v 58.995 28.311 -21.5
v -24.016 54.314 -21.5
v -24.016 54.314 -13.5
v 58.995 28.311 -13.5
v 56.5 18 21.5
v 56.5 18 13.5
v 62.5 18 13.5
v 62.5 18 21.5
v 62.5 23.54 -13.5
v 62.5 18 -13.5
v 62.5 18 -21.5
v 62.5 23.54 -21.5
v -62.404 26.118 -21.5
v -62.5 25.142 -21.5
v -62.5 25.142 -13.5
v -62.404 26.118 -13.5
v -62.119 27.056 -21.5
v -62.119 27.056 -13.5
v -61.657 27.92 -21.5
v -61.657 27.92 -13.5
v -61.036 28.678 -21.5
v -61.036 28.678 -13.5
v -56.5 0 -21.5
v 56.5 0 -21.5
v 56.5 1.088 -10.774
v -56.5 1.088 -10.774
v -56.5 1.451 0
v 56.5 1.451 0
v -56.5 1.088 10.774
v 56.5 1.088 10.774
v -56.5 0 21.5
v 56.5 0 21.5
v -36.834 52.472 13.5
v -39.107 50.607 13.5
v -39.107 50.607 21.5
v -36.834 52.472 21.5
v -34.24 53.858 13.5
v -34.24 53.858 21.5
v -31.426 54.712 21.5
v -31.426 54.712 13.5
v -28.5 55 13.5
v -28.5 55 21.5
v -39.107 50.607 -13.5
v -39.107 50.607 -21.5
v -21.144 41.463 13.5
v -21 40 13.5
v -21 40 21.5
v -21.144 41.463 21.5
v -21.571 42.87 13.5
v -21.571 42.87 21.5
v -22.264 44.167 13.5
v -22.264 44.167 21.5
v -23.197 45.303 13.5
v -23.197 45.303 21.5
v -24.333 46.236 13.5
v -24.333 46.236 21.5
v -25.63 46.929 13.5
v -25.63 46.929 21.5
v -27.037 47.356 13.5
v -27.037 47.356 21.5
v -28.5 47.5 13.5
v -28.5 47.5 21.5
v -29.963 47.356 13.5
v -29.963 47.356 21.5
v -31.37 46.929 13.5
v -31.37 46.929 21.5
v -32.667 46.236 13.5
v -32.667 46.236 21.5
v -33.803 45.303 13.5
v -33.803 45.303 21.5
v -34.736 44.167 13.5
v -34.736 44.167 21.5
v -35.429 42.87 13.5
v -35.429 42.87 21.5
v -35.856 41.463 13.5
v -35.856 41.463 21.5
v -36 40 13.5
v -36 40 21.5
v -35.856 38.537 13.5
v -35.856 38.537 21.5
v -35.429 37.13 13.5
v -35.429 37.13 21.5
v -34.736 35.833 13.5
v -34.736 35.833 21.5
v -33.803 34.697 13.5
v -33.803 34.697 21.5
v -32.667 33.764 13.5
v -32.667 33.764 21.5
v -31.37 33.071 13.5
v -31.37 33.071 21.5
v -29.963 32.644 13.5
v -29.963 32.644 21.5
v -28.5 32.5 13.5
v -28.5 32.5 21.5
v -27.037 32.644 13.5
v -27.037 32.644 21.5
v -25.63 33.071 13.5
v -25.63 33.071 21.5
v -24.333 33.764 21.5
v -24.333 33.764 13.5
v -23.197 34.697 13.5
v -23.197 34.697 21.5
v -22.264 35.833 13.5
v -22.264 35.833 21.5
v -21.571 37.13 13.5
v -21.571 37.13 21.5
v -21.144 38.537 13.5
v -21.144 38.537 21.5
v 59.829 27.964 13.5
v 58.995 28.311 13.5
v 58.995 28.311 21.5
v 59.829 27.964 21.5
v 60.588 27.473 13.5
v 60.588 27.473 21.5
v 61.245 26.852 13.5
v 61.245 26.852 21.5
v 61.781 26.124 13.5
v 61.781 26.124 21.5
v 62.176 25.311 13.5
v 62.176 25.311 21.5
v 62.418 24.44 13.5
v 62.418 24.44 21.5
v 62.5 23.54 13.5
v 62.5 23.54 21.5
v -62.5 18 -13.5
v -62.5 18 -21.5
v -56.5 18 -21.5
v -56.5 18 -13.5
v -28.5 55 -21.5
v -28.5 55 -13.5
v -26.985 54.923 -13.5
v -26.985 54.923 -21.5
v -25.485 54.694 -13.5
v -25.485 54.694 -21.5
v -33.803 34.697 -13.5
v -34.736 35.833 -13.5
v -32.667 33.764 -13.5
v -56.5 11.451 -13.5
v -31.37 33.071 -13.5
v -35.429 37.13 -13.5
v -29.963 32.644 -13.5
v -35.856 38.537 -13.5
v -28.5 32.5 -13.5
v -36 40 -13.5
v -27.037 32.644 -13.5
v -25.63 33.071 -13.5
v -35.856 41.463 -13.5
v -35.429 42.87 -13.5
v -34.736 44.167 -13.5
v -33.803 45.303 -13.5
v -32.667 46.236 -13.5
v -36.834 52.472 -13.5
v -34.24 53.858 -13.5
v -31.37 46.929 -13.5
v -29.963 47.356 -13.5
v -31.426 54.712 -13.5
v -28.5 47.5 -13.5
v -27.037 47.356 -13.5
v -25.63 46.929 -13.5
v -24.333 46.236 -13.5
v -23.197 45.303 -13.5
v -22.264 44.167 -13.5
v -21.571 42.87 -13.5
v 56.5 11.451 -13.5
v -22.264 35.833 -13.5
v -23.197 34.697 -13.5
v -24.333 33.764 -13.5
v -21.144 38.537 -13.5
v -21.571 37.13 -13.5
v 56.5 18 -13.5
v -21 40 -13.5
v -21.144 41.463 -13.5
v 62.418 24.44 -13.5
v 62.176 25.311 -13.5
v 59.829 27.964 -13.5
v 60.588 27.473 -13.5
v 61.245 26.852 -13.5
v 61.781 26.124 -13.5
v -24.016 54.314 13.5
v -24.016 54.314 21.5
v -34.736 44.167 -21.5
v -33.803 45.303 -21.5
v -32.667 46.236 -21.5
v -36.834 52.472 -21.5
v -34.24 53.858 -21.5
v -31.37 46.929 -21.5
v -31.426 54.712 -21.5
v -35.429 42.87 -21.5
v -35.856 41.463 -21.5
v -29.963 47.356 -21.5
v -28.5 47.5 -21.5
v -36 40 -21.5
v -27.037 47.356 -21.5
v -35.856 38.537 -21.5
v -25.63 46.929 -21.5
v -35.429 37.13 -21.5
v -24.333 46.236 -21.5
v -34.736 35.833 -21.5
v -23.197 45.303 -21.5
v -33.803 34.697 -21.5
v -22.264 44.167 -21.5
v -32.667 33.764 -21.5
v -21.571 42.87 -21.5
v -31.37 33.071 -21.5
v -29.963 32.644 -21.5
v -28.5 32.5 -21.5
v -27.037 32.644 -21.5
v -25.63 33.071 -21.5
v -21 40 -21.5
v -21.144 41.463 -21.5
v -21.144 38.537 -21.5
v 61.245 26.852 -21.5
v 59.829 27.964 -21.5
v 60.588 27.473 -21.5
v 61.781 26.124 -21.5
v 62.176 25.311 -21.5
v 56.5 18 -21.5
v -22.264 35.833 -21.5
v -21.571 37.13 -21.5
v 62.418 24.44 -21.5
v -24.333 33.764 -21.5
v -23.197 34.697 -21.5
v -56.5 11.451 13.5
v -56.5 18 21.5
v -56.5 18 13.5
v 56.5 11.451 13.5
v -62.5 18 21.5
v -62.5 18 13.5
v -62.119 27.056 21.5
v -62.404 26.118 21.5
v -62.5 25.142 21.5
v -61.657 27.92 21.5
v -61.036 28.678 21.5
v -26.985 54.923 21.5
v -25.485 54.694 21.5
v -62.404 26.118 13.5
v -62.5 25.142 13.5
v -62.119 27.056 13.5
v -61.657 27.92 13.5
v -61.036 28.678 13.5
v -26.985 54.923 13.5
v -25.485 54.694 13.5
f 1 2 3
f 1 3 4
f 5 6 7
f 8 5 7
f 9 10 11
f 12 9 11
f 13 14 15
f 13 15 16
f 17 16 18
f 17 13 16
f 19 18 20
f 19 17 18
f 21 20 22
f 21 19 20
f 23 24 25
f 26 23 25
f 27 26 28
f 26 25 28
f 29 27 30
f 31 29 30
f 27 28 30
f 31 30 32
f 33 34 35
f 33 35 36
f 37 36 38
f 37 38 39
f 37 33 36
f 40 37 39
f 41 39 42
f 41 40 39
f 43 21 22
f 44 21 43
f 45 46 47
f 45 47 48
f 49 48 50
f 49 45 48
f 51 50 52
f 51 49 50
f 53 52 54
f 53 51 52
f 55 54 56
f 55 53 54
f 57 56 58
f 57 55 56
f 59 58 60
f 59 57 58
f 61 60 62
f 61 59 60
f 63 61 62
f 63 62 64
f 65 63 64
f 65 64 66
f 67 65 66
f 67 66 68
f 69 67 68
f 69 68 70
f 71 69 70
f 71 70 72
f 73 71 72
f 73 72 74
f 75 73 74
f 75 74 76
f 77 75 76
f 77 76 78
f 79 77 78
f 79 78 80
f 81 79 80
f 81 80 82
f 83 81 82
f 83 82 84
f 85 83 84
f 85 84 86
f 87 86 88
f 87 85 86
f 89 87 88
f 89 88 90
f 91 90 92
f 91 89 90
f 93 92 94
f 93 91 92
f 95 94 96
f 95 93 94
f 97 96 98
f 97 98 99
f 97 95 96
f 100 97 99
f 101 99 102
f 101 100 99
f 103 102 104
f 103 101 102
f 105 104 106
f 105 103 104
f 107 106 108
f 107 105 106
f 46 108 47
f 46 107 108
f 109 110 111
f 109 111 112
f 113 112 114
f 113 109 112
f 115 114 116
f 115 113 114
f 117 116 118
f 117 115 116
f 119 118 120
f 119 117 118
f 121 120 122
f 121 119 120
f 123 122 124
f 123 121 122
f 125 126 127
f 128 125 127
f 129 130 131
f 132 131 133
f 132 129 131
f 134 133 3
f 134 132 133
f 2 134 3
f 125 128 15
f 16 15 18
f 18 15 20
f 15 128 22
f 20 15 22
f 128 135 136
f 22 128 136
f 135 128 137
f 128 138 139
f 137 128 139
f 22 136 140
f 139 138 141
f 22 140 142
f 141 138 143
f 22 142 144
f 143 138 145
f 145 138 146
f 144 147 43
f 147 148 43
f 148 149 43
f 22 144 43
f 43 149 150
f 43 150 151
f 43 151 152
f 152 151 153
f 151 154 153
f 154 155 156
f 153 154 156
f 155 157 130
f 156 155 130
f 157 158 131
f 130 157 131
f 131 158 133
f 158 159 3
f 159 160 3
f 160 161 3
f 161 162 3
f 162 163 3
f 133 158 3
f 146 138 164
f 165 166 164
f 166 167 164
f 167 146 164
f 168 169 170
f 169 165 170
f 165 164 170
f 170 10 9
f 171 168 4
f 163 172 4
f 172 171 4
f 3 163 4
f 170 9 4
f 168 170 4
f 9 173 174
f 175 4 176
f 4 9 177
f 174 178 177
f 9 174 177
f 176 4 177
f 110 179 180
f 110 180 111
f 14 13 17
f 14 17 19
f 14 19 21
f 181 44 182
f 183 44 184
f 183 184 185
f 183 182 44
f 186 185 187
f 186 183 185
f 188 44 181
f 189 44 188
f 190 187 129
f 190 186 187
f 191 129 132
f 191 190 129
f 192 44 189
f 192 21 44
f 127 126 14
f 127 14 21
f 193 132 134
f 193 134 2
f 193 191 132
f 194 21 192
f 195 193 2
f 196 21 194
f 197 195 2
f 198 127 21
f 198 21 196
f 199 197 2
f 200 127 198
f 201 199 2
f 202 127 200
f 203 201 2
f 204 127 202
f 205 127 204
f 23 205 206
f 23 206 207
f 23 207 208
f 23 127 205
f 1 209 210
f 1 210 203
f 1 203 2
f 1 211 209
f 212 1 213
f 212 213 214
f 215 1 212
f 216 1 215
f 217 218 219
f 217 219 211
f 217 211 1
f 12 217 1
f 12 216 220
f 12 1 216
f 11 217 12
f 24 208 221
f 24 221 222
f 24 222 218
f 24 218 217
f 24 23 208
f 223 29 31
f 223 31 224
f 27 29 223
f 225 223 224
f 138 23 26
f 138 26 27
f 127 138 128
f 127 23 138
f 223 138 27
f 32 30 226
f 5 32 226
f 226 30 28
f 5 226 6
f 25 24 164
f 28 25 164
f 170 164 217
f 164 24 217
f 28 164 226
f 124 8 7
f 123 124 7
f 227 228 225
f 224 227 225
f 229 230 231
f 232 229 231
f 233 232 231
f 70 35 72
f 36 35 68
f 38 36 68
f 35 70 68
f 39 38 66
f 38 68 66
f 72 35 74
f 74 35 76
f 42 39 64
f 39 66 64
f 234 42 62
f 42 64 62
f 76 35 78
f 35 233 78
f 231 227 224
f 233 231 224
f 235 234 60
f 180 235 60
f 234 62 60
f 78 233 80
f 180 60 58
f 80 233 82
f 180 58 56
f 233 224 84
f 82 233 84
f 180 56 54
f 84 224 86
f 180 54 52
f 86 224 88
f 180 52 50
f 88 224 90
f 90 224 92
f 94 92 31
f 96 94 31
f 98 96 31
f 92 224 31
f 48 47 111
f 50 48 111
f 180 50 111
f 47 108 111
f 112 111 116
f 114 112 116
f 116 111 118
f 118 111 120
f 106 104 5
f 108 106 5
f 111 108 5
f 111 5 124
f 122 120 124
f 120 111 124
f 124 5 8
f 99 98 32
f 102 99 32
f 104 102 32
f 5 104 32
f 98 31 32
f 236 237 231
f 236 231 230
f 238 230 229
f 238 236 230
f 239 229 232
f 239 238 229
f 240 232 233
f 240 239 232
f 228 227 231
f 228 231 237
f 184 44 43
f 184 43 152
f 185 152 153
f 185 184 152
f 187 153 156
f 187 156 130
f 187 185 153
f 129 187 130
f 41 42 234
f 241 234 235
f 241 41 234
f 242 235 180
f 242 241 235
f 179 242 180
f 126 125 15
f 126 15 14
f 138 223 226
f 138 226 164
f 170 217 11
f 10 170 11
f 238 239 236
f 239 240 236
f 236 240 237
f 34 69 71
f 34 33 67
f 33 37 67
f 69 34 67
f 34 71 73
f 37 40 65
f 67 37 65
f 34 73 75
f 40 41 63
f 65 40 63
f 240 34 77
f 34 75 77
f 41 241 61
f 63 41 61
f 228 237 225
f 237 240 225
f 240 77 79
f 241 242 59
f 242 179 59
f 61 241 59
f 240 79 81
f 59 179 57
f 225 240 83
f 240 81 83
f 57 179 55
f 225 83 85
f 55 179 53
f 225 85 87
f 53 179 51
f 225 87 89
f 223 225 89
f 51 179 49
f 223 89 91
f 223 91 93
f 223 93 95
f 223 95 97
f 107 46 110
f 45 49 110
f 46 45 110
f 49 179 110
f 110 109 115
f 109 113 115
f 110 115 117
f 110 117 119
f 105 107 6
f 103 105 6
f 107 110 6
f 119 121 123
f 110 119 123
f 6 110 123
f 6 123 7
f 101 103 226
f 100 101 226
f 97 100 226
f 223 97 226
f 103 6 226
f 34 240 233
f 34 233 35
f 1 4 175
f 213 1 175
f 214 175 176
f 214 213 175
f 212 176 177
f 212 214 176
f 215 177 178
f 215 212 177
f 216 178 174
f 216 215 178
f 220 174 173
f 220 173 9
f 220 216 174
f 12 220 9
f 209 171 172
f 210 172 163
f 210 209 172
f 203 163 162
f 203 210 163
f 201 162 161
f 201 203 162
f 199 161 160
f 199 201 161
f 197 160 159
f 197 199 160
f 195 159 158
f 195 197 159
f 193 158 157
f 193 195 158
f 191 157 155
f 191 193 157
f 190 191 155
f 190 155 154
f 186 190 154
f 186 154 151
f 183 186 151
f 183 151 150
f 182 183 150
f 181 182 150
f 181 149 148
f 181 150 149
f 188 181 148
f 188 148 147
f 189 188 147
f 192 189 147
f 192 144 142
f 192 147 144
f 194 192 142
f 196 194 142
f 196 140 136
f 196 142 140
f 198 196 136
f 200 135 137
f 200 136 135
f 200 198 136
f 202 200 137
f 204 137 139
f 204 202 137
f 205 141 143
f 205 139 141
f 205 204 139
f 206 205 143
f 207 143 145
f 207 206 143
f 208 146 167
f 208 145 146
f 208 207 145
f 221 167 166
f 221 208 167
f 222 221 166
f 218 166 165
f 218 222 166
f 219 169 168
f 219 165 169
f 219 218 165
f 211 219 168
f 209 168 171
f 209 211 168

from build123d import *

# Parameters (mm, degrees)
SKETCH1_W           = 125
SKETCH1_H           = 43
BOSS_EXTRUDE1_DEPTH = 55
SKETCH2_OUTSIDE_W   = 155.634
SKETCH2_OUTSIDE_H   = 85.634
SKETCH2_OUTSIDE_R   = 7.5
CUT_EXTRUDE1_DEPTH  = 94.702988213
SKETCH8_R           = 160
CUT_EXTRUDE3_DEPTH  = 133.846716181
SKETCH3_W           = 27
SKETCH3_H           = 43.548888359
CUT_EXTRUDE2_DEPTH  = 139.247061452


with BuildPart() as part:
    # Sketch1 → Boss-Extrude1 (new body)
    with BuildSketch(Plane(origin=(0, 0, 0), x_dir=(1, 0, 0), z_dir=(0, 1, 0))):
        Rectangle(SKETCH1_W, SKETCH1_H)
    extrude(amount=BOSS_EXTRUDE1_DEPTH)

    # Sketch2 outside → Cut-Extrude1 (cut, through all)
    # profile 1 of 2: a face of its own
    with BuildSketch(Plane.XY.offset(21.5)):
        with Locations((0, 27.5)):
            Rectangle(SKETCH2_OUTSIDE_W, SKETCH2_OUTSIDE_H)
        with BuildLine():
            Line((-56.5, 18), (-56.5, 0))
            Line((-56.5, 0), (56.5, 0))
            Line((56.5, 0), (56.5, 18))
            Line((56.5, 18), (62.5, 18))
            Line((62.5, 18), (62.5, 23.539869777))
            ThreePointArc((62.5, 23.539869777), (61.529461255, 26.500180908), (58.994623203, 28.311253379))
            Line((58.994623203, 28.311253379), (-24.016130392, 54.314150807))
            ThreePointArc((-24.016130392, 54.314150807), (-32.078888401, 54.566796416), (-39.106601718, 50.606601718))
            Line((-39.106601718, 50.606601718), (-61.035533906, 28.67766953))
            ThreePointArc((-61.035533906, 28.67766953), (-62.119397663, 27.055552786), (-62.5, 25.142135624))
            Line((-62.5, 25.142135624), (-62.5, 18))
            Line((-62.5, 18), (-56.5, 18))
        make_face(mode=Mode.SUBTRACT)
    # profile 2 of 2: a face of its own
    with BuildSketch(Plane.XY.offset(21.5)):
        with Locations((-28.5, 40)):
            Circle(SKETCH2_OUTSIDE_R)
    extrude(amount=-CUT_EXTRUDE1_DEPTH, mode=Mode.SUBTRACT)

    # Sketch8 → Cut-Extrude3 (cut, through all)
    with BuildSketch(Plane(origin=(56.5, 0, 0), x_dir=(0, 0, -1), z_dir=(1, 0, 0))):
        with Locations((0, -158.548888359)):
            Circle(SKETCH8_R)
    extrude(amount=-CUT_EXTRUDE3_DEPTH, mode=Mode.SUBTRACT)

    # Sketch3 → Cut-Extrude2 (cut, through all)
    with BuildSketch(Plane(origin=(62.5, 0, 0), x_dir=(0, 0, -1), z_dir=(1, 0, 0))):
        with Locations((0, 33.22555582)):
            Rectangle(SKETCH3_W, SKETCH3_H)
    extrude(amount=-CUT_EXTRUDE2_DEPTH, mode=Mode.SUBTRACT)


solid = part.part
